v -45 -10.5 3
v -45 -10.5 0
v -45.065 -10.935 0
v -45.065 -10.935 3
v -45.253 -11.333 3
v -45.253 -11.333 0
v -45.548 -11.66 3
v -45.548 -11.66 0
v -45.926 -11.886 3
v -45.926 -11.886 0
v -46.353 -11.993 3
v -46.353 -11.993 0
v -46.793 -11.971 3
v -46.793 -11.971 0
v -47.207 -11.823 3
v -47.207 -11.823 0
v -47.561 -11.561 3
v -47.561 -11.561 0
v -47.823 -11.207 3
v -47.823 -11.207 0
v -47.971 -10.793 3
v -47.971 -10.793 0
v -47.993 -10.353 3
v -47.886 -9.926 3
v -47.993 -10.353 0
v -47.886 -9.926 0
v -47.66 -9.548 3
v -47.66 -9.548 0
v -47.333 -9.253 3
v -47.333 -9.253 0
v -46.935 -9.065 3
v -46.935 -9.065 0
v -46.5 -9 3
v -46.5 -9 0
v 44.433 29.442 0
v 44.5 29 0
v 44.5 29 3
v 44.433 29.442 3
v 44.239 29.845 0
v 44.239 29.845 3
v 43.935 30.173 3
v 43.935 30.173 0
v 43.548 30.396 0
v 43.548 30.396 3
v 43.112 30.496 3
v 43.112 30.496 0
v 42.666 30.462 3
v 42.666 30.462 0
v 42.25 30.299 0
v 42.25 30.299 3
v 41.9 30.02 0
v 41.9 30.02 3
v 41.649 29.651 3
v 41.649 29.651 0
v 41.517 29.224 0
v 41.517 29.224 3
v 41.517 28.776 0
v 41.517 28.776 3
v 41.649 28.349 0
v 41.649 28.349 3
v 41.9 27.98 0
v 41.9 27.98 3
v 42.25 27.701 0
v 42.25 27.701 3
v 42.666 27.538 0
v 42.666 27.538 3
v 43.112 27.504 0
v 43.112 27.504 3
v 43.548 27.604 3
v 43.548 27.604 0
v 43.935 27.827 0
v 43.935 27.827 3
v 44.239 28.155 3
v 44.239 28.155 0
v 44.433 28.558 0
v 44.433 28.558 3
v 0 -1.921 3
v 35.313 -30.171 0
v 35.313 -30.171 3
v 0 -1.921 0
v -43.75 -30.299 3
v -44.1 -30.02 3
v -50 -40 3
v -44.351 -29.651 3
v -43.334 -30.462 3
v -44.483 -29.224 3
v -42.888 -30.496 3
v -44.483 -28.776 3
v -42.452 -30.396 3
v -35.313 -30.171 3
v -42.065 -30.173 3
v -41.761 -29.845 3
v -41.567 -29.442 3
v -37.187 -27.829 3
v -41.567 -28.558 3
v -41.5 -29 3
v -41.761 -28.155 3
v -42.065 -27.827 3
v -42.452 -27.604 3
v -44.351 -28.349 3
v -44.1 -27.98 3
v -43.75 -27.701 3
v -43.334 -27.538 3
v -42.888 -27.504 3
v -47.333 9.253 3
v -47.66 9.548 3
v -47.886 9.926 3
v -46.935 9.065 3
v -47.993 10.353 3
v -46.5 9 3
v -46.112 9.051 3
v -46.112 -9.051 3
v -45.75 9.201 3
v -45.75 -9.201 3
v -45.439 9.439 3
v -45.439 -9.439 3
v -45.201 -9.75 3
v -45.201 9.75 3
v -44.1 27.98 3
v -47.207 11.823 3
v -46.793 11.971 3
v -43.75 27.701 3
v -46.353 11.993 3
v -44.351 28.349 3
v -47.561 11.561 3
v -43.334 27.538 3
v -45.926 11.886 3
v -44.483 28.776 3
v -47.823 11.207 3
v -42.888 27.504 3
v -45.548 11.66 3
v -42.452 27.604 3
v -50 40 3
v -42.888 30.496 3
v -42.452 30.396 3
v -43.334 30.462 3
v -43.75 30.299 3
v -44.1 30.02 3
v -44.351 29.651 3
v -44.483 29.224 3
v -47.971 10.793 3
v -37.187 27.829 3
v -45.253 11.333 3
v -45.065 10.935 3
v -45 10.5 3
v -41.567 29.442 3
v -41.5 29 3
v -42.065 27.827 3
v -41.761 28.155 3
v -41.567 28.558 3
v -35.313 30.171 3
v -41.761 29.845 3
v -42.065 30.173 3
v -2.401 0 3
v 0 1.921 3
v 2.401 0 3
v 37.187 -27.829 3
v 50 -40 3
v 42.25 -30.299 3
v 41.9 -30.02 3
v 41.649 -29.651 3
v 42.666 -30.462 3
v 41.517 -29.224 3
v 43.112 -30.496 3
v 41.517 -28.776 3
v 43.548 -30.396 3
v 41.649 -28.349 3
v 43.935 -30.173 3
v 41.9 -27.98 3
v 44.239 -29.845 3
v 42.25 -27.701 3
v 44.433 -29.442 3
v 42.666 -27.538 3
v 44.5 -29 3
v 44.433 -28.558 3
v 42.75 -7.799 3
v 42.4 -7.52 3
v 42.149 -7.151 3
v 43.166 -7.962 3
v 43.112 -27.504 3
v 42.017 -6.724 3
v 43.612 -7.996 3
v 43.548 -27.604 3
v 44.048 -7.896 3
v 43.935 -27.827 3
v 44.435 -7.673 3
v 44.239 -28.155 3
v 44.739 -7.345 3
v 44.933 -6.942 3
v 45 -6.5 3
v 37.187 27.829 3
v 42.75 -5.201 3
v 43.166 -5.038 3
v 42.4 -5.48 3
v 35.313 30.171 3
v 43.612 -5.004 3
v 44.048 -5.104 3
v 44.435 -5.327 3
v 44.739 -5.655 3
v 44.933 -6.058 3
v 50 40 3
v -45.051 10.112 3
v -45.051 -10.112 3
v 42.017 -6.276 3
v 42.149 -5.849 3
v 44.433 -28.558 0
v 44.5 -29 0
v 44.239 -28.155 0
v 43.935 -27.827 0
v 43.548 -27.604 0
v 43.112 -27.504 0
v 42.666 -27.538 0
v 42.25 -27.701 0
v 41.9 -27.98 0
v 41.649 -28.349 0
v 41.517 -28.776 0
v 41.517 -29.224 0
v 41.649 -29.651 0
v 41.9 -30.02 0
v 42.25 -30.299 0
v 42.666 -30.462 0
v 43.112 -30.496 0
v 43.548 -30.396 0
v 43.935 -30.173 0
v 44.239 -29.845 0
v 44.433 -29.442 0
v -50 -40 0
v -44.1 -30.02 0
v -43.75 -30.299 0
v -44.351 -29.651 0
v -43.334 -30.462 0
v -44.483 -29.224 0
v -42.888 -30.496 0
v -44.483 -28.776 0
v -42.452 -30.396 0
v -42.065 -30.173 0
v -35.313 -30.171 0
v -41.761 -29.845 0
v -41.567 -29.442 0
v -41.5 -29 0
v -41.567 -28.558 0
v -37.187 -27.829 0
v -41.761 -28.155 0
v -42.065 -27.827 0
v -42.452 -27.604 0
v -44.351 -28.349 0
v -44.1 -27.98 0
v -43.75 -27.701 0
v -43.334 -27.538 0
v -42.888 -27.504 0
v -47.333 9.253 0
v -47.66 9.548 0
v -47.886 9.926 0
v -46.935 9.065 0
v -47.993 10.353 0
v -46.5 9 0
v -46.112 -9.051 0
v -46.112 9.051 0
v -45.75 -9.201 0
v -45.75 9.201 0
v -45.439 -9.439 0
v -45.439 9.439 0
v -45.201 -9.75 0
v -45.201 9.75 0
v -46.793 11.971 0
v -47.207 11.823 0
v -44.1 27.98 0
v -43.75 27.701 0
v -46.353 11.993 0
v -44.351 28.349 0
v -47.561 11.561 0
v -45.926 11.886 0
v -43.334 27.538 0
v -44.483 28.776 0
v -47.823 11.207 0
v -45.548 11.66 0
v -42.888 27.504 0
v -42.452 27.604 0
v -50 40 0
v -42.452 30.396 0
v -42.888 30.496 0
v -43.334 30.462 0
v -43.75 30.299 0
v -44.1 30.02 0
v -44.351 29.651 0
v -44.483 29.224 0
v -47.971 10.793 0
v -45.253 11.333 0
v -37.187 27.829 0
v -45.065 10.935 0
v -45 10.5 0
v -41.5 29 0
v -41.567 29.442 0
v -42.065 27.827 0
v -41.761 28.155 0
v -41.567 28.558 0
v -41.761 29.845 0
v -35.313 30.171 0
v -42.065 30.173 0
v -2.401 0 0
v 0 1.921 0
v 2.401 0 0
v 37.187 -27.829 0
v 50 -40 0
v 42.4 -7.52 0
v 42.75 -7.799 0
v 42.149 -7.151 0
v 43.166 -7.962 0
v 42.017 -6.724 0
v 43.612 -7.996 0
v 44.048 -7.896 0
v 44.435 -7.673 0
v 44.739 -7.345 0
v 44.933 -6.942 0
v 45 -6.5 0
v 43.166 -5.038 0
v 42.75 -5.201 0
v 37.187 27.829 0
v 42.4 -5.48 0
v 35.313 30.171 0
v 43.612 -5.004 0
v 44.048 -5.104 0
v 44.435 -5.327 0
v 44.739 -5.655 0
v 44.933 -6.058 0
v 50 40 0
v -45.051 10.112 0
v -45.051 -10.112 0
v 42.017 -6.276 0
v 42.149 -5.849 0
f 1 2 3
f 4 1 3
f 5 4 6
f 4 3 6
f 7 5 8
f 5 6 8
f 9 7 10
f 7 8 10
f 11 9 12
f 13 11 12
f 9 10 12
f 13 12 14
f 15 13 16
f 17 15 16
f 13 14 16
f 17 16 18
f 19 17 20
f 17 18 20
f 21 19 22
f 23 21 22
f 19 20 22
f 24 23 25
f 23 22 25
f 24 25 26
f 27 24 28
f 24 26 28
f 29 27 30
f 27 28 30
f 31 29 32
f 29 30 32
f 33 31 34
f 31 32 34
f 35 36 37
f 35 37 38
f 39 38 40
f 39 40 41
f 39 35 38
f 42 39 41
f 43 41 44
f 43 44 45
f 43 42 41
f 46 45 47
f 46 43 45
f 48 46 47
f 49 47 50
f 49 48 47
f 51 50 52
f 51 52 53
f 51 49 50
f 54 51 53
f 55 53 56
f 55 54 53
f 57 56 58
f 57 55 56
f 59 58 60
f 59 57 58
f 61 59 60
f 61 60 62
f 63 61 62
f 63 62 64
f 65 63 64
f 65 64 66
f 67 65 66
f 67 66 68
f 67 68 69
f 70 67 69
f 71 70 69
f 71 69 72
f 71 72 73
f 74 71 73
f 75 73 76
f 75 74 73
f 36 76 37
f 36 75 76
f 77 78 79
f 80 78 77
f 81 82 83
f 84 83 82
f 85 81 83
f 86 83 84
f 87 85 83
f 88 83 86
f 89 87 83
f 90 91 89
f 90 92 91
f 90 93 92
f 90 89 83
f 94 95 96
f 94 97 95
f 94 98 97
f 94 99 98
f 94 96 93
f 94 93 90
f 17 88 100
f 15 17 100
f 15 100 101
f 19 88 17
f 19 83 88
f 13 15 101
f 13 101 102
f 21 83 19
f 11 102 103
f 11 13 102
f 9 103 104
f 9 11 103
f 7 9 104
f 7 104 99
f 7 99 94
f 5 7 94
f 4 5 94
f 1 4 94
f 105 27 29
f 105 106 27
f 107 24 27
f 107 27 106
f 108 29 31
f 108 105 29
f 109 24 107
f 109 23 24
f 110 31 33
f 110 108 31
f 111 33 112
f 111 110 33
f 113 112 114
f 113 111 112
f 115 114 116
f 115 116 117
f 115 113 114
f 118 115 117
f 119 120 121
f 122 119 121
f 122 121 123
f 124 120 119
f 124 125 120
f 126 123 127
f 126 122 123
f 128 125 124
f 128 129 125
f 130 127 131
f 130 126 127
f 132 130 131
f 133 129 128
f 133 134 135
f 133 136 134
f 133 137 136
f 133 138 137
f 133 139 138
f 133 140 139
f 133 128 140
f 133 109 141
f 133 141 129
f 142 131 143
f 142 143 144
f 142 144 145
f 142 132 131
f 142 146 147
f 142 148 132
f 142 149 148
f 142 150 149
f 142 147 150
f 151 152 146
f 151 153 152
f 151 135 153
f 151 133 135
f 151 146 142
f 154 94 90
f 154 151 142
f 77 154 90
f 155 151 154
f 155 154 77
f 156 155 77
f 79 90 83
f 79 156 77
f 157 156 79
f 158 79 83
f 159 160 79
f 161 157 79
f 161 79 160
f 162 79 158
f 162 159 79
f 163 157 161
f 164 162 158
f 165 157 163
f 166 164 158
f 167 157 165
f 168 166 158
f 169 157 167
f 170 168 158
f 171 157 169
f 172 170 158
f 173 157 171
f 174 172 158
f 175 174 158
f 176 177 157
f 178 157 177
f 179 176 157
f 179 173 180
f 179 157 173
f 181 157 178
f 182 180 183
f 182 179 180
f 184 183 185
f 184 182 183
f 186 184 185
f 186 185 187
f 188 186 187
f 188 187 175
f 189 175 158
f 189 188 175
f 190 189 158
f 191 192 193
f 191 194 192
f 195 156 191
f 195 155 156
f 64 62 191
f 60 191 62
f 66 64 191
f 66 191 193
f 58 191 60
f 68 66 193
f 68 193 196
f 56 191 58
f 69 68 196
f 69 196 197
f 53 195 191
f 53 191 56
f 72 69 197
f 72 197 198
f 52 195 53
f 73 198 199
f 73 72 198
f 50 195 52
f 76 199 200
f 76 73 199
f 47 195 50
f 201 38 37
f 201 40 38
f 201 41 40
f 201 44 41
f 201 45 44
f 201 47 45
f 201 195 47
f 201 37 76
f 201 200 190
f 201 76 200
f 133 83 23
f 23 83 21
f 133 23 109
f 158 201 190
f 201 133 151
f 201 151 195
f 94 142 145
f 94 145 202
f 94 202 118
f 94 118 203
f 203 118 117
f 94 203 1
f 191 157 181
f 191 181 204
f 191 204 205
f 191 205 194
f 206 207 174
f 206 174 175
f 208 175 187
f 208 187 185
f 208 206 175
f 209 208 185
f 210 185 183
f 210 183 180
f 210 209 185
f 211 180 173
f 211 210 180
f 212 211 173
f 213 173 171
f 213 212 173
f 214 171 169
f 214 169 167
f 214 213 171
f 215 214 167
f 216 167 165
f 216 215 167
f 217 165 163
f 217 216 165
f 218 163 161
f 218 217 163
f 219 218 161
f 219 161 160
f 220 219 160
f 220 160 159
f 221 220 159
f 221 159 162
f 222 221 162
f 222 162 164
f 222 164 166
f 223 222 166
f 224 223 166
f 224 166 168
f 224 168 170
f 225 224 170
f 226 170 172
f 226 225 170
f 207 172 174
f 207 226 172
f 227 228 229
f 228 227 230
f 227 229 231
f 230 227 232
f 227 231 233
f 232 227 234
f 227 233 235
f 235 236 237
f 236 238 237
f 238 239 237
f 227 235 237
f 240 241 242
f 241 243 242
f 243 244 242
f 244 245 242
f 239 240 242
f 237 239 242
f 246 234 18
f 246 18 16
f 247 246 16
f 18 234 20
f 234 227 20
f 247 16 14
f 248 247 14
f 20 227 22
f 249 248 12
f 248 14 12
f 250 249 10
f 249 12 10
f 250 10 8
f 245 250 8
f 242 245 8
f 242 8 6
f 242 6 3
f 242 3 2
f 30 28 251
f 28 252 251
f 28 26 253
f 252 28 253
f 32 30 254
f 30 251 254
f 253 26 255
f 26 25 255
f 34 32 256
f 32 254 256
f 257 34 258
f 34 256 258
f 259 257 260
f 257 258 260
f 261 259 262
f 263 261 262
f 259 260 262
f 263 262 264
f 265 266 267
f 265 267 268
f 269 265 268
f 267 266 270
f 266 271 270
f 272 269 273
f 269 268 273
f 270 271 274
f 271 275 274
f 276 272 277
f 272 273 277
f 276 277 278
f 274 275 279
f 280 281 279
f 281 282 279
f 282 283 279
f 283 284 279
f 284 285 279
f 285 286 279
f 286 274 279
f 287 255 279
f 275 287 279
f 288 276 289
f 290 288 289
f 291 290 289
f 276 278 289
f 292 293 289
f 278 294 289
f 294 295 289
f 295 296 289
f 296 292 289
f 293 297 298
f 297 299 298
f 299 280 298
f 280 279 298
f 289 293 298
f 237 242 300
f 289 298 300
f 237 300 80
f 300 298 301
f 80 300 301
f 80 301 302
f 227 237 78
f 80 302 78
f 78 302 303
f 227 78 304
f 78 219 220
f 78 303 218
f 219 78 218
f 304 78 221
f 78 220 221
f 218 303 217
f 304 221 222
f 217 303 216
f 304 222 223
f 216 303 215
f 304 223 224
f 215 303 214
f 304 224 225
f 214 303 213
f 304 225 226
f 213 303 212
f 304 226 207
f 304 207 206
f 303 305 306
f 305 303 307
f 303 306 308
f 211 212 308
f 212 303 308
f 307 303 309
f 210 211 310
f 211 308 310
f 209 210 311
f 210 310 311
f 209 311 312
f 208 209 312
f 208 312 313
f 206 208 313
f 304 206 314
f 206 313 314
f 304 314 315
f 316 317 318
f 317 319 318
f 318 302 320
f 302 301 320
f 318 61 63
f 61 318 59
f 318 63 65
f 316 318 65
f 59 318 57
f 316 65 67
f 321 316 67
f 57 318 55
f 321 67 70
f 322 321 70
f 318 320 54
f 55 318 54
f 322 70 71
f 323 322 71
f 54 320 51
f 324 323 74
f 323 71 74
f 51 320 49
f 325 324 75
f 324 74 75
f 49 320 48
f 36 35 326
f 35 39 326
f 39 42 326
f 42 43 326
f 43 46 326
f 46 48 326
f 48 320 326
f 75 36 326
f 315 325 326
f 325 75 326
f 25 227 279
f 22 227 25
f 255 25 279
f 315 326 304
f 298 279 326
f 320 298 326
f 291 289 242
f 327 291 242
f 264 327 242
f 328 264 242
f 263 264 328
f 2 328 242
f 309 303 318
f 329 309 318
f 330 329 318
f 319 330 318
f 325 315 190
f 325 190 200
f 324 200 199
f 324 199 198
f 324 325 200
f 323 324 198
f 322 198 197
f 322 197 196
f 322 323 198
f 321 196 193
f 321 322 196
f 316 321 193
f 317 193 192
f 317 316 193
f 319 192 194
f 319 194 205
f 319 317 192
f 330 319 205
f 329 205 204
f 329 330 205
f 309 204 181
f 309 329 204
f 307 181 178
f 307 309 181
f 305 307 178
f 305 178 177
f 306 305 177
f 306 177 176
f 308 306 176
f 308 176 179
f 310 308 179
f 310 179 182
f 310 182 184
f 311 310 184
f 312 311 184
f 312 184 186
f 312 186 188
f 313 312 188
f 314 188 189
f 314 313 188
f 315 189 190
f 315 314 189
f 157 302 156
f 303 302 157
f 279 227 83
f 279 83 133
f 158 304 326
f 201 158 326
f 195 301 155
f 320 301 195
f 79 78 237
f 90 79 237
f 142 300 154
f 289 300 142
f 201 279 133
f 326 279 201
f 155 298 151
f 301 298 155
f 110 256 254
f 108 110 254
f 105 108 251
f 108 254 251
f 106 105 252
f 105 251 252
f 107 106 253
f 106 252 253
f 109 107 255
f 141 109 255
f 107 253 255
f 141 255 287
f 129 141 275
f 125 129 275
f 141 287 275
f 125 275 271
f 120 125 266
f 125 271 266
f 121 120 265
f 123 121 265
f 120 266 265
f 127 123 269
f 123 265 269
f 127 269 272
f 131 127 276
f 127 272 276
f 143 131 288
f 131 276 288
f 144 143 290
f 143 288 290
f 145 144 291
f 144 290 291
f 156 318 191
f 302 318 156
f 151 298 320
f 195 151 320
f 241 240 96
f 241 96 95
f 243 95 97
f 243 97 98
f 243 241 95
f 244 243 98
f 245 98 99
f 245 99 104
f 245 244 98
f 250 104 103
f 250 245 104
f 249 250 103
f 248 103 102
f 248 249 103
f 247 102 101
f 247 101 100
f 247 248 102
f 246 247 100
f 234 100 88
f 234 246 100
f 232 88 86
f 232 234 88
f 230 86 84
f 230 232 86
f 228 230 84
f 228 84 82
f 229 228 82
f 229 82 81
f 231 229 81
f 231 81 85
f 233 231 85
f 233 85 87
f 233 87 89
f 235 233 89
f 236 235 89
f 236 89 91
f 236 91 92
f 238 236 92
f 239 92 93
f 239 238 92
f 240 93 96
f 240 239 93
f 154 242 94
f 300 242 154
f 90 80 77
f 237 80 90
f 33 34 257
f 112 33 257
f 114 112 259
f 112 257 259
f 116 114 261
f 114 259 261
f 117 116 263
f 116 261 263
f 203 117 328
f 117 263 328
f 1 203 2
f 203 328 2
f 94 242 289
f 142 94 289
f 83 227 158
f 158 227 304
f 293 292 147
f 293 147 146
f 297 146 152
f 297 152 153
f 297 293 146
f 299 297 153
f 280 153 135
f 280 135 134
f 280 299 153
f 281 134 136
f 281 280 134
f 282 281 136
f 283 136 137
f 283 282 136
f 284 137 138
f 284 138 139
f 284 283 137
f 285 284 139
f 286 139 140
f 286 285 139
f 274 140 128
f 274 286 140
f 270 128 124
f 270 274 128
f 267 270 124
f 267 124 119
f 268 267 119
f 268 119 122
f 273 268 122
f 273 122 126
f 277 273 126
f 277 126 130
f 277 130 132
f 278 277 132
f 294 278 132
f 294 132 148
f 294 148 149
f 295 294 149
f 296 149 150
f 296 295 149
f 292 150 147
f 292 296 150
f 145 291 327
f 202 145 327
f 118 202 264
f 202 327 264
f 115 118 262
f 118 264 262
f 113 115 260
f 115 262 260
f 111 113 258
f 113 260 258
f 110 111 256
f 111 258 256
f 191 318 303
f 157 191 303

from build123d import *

# Parameters (mm, degrees)
EXTRUDE_2_DEPTH = 3
SKETCH_1_5_W    = 100
SKETCH_1_5_H    = 80
SKETCH_1_5_R    = 1.5
EXTRUDE_3_DEPTH = 3


with BuildPart() as part:
    # 草图1 → 凸台-拉伸2 (new body)
    with BuildSketch(Plane.XY):
        with BuildLine():
            Line((-35.312957429, 30.171303214), (0, 1.920937271))
            Line((0, 1.920937271), (35.312957429, 30.171303214))
            ThreePointArc((35.312957429, 30.171303214), (37.421303214, 29.937042571), (37.187042571, 27.828696786))
            Line((37.187042571, 27.828696786), (2.401171589, 0))
            Line((2.401171589, 0), (37.187042571, -27.828696786))
            ThreePointArc((37.187042571, -27.828696786), (37.421303214, -29.937042571), (35.312957429, -30.171303214))
            Line((35.312957429, -30.171303214), (0, -1.920937271))
            Line((0, -1.920937271), (-35.312957429, -30.171303214))
            ThreePointArc((-35.312957429, -30.171303214), (-37.421303214, -29.937042571), (-37.187042571, -27.828696786))
            Line((-37.187042571, -27.828696786), (-2.401171589, 0))
            Line((-2.401171589, 0), (-37.187042571, 27.828696786))
            ThreePointArc((-37.187042571, 27.828696786), (-37.421303214, 29.937042571), (-35.312957429, 30.171303214))
        make_face()
    extrude(amount=EXTRUDE_2_DEPTH)

    # 草图1<5> → 凸台-拉伸3 (add)
    with BuildSketch(Plane.XY):
        Rectangle(SKETCH_1_5_W, SKETCH_1_5_H)
        with Locations((-43, -29)):
            Circle(SKETCH_1_5_R, mode=Mode.SUBTRACT)
        with BuildLine():
            ThreePointArc((-45, -10.5), (-47.560660172, -11.560660172), (-46.5, -9))
            ThreePointArc((-46.5, -9), (-45.439339828, -9.439339828), (-45, -10.5))
        make_face(mode=Mode.SUBTRACT)
        with Locations((43, -29)):
            Circle(SKETCH_1_5_R, mode=Mode.SUBTRACT)
        with Locations((43.5, -6.5)):
            Circle(SKETCH_1_5_R, mode=Mode.SUBTRACT)
        with BuildLine():
            ThreePointArc((-45, 10.5), (-45.439339828, 9.439339828), (-46.5, 9))
            ThreePointArc((-46.5, 9), (-47.560660172, 11.560660172), (-45, 10.5))
        make_face(mode=Mode.SUBTRACT)
        with Locations((-43, 29)):
            Circle(SKETCH_1_5_R, mode=Mode.SUBTRACT)
        with BuildLine():
            ThreePointArc((-37.187042571, 27.828696786), (-37.421303214, 29.937042571), (-35.312957429, 30.171303214))
            Line((-35.312957429, 30.171303214), (35.312957429, 30.171303214))
            ThreePointArc((35.312957429, 30.171303214), (37.421303214, 29.937042571), (37.187042571, 27.828696786))
            Line((37.187042571, 27.828696786), (37.187042571, -27.828696786))
            ThreePointArc((37.187042571, -27.828696786), (37.421303214, -29.937042571), (35.312957429, -30.171303214))
            Line((35.312957429, -30.171303214), (-35.312957429, -30.171303214))
            ThreePointArc((-35.312957429, -30.171303214), (-37.421303214, -29.937042571), (-37.187042571, -27.828696786))
            Line((-37.187042571, -27.828696786), (-37.187042571, 27.828696786))
        make_face(mode=Mode.SUBTRACT)
        with Locations((43, 29)):
            Circle(SKETCH_1_5_R, mode=Mode.SUBTRACT)
    extrude(amount=EXTRUDE_3_DEPTH)


solid = part.part
